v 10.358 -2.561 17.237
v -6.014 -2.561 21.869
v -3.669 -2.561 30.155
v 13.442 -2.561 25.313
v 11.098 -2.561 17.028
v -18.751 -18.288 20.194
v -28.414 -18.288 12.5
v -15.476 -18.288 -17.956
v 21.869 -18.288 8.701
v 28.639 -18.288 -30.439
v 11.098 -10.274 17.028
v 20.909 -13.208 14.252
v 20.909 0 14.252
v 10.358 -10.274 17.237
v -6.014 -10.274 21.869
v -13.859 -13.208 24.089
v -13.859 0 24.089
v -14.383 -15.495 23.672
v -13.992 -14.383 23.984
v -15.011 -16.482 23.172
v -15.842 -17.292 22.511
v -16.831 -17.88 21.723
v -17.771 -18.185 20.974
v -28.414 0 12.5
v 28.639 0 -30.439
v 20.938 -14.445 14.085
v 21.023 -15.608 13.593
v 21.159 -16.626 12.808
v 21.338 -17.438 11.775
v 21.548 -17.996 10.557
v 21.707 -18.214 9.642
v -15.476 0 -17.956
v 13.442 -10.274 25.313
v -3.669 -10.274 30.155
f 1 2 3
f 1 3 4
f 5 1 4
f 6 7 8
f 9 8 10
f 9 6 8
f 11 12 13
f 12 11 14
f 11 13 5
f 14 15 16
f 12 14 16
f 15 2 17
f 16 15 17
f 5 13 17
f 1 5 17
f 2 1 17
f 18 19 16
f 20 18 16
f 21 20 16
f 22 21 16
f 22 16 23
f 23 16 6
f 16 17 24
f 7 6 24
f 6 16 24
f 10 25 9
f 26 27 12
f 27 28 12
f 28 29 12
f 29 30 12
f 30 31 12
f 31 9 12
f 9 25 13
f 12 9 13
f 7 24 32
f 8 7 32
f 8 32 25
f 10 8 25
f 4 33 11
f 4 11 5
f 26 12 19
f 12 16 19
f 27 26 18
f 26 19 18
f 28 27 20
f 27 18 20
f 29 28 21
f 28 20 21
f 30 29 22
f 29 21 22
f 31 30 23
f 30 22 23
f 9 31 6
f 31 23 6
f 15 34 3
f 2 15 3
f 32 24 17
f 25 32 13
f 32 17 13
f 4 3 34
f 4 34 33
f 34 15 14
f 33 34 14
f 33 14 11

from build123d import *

# Parameters (mm, degrees)
F1_DEPTH = 18.288
F2_W     = 17.783007
F2_H     = 7.712702
F3_DEPTH = 8.6106
F4_R     = 5.08


with BuildPart() as f1:
    # F0 (on Front) → F1 (new body)
    with BuildSketch(Plane.XZ):
        Polygon((-13.85931, 24.089288), (-28.41359, 12.499769), (-15.476452, -17.956408), (28.639189, -30.43874), (20.909246, 14.251674), align=None)
    extrude(amount=F1_DEPTH)

    # F2 (on face) → F3 (join)
    with BuildSketch(Plane(origin=(5.283426, 0, 18.672932), x_dir=(0.962224, 0, -0.272257), z_dir=(0.272257, 0, 0.962224))):
        with Locations((-2.849124, -6.417316)):
            Rectangle(F2_W, F2_H)
    extrude(amount=F3_DEPTH)

    # F4
    f4_edges = [f1.edges().sort_by_distance(p)[0] for p in [
        (3.524968, -18.288, 19.170481),
    ]]
    fillet(f4_edges, radius=F4_R)


solid = f1.part
